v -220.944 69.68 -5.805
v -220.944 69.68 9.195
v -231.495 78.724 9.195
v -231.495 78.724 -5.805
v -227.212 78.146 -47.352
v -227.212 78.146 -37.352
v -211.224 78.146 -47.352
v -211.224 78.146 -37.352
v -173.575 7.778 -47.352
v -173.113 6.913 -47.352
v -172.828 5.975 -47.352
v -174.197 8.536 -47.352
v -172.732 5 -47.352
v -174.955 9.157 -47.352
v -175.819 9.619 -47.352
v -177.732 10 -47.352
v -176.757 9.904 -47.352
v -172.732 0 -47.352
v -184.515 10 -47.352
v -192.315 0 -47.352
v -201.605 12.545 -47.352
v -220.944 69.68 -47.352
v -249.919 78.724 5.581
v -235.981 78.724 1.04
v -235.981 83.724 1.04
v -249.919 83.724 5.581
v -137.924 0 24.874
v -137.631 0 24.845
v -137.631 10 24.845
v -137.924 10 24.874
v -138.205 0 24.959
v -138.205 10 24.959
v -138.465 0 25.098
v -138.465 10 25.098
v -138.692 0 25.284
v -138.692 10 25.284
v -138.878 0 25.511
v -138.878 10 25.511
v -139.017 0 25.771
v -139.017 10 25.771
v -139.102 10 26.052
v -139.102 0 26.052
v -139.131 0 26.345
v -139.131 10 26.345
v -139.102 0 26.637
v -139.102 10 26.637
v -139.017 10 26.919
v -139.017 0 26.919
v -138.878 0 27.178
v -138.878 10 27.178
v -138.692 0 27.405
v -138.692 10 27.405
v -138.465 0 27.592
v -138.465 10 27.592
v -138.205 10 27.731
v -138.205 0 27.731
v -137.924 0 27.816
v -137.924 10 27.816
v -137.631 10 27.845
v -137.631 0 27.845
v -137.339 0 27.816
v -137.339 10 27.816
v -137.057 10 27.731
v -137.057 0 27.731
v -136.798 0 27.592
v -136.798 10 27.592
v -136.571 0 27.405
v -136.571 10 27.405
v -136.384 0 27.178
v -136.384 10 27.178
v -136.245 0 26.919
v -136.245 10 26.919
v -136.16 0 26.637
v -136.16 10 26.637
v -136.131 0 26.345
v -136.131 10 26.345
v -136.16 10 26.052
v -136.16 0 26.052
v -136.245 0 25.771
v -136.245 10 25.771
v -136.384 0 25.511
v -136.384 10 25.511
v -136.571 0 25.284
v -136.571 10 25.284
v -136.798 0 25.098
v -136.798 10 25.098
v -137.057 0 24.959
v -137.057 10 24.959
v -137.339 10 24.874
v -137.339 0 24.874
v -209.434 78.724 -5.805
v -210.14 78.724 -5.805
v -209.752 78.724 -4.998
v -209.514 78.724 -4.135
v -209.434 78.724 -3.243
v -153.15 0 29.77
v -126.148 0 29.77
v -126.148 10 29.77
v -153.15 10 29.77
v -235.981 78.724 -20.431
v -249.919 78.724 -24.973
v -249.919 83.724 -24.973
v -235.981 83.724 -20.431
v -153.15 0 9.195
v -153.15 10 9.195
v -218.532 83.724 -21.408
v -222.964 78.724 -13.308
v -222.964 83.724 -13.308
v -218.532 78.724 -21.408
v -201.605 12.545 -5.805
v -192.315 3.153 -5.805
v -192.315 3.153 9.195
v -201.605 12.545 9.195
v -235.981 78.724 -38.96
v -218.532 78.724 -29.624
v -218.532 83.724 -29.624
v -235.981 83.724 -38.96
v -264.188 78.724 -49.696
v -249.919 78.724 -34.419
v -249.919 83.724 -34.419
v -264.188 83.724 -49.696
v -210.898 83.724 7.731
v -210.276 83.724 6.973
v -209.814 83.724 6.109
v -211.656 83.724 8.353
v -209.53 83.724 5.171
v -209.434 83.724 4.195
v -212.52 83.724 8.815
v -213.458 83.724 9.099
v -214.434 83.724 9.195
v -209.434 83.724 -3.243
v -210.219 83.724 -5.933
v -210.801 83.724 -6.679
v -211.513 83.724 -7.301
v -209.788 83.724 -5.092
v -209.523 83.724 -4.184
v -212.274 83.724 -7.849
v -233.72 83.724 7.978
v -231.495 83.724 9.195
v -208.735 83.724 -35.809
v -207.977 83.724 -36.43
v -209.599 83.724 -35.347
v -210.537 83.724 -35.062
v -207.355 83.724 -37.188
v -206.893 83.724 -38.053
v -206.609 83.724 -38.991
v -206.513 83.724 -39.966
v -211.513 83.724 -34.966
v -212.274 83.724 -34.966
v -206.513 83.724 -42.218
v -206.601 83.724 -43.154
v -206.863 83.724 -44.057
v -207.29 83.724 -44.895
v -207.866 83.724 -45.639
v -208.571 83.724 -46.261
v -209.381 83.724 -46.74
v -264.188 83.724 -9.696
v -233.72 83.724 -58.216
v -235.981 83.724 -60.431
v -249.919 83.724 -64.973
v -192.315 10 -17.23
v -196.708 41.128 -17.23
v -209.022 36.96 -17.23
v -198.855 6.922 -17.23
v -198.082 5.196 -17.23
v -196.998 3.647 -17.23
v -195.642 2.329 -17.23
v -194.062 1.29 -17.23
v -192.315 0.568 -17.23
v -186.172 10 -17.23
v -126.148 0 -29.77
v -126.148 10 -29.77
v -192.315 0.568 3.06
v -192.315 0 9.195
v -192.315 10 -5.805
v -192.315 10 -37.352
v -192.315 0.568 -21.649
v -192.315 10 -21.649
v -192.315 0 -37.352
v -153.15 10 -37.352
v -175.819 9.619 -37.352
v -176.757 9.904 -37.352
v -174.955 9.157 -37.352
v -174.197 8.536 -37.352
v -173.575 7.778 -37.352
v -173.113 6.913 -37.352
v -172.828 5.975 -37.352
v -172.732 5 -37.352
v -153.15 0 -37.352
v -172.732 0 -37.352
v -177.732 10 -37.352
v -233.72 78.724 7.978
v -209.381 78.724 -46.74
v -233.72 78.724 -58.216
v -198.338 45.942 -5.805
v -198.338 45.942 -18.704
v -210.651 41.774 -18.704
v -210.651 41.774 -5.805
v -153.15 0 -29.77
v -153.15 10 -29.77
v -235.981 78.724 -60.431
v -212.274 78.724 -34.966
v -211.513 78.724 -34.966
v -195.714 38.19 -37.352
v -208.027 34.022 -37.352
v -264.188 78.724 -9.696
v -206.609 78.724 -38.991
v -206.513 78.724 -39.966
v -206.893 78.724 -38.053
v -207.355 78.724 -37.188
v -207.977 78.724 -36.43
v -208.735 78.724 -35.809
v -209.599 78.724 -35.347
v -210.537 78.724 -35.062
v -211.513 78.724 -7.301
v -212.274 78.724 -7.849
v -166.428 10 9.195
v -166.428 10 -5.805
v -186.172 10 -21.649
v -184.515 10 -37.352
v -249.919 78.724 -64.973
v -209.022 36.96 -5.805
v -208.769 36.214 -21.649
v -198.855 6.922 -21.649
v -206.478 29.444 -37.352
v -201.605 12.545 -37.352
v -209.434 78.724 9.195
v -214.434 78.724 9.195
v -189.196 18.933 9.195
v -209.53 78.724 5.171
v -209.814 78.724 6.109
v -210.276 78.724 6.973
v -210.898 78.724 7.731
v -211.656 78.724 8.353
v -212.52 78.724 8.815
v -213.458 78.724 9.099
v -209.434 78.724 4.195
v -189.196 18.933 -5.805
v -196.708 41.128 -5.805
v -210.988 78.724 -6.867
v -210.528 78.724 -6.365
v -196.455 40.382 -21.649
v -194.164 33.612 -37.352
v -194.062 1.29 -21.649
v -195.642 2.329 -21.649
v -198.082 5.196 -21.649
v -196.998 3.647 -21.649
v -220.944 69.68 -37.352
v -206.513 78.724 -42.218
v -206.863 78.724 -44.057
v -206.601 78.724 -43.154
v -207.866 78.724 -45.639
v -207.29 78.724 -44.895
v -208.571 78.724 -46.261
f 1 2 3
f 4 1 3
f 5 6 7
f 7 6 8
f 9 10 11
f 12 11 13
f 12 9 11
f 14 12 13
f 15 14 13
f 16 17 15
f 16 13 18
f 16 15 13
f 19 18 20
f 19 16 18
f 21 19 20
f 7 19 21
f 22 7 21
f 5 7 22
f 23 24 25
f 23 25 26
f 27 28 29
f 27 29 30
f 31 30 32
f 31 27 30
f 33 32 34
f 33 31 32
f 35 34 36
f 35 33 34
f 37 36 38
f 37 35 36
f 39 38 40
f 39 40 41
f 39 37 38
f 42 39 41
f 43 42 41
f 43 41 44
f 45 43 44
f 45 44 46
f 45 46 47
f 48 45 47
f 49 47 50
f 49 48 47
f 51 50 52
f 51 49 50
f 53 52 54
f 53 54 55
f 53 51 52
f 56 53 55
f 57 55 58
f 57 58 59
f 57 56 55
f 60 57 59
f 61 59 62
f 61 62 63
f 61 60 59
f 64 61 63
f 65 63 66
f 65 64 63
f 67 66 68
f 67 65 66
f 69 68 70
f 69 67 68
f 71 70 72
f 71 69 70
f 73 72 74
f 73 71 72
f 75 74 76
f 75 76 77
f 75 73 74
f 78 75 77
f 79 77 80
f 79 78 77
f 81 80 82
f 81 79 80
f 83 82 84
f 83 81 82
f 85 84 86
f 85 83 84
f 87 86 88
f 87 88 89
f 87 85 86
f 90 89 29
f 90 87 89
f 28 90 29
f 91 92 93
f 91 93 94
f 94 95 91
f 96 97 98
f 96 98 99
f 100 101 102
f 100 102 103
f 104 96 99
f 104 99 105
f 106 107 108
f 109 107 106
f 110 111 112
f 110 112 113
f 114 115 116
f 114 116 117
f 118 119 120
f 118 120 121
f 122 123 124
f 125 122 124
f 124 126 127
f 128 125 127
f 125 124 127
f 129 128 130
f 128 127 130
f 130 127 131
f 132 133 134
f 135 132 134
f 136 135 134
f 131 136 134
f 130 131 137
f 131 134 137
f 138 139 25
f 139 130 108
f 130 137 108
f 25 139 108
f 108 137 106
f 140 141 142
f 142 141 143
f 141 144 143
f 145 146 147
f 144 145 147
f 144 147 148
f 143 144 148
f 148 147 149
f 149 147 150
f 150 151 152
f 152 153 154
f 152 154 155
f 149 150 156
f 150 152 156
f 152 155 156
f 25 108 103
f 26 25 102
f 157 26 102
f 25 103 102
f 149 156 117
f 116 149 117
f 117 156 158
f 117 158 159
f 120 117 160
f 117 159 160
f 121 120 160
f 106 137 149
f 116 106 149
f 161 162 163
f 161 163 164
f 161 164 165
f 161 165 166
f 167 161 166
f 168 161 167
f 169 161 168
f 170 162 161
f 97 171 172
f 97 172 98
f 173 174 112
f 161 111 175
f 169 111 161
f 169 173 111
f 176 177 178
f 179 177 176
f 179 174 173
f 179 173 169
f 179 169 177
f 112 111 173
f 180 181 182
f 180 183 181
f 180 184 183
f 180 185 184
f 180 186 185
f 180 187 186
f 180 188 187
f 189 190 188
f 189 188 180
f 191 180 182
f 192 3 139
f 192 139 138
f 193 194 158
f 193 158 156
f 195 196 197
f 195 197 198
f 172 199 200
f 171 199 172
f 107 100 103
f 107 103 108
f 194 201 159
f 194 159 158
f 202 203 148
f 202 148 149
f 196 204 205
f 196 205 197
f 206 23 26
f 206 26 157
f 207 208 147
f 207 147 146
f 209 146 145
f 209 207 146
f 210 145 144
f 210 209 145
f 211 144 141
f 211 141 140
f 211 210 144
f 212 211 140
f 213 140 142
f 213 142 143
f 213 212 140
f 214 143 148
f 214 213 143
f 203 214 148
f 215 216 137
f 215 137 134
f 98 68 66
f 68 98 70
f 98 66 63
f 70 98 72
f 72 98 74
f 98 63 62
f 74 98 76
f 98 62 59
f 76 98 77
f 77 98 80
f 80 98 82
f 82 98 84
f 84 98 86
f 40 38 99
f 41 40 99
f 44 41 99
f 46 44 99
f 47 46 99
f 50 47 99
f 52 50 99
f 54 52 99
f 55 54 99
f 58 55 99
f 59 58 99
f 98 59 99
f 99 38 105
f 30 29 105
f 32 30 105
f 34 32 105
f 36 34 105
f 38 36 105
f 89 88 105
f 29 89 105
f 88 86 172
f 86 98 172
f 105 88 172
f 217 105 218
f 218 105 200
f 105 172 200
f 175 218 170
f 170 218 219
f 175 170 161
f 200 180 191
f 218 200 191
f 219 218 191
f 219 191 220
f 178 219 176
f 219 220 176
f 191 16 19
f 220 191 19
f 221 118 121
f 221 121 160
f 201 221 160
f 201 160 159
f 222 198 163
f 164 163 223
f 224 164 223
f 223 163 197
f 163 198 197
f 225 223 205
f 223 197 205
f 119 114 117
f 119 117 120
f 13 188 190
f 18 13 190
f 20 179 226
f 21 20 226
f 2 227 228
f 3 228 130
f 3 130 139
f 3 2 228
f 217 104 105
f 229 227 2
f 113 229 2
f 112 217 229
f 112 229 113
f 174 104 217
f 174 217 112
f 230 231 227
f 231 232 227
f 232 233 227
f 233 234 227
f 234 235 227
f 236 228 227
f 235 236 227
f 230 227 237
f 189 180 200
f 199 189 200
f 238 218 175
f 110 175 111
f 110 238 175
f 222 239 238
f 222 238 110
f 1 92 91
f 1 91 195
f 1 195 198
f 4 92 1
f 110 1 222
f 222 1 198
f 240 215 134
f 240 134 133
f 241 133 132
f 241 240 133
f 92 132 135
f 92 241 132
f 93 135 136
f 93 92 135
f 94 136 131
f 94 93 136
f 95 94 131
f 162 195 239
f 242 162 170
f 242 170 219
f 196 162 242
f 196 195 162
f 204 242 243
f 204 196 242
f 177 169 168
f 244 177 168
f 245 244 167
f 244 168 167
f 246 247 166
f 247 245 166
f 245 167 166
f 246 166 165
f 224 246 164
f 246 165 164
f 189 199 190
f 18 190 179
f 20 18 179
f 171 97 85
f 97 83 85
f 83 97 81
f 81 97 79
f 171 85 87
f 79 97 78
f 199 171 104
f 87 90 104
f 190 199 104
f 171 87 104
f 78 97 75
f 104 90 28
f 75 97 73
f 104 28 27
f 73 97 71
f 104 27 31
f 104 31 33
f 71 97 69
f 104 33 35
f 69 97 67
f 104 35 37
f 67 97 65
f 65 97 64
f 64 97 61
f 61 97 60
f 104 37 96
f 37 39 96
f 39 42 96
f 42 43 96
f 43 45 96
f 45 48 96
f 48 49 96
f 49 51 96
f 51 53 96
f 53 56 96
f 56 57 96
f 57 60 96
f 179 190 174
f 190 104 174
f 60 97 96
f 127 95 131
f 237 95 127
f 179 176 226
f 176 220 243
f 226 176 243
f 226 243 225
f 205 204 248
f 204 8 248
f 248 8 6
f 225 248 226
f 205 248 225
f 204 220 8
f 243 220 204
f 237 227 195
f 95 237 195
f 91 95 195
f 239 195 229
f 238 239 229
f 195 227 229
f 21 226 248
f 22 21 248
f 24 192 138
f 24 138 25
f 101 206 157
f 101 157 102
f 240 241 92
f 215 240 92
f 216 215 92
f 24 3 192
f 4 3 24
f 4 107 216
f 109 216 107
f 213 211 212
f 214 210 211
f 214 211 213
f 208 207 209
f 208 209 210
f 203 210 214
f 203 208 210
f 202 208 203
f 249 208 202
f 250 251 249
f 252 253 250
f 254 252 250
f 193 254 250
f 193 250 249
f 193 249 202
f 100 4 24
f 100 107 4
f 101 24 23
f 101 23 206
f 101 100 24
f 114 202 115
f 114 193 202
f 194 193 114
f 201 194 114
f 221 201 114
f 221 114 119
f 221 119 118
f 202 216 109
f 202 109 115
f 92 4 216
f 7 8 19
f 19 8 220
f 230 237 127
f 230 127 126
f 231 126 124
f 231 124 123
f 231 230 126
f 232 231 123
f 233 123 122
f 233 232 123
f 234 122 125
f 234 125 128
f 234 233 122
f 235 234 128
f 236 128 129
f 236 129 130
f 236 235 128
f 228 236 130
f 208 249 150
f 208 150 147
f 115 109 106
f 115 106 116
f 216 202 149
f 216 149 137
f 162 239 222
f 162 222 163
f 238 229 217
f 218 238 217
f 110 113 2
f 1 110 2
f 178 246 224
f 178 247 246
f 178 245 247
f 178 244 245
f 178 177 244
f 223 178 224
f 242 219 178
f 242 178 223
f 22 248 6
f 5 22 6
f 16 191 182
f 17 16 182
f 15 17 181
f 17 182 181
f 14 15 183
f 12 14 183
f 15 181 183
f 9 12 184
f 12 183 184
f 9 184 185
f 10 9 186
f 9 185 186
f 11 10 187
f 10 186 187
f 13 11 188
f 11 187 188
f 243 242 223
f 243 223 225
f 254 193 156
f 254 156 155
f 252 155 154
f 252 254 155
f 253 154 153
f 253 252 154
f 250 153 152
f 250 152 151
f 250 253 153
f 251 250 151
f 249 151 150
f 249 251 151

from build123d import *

# Parameters (mm, degrees)
CROQUIS1_R              = 1.5
SALIENTE_EXTRUIR1_DEPTH = 10
SALIENTE_EXTRUIR2_DEPTH = 15
SALIENTE_EXTRUIR3_DEPTH = 13
SALIENTE_EXTRUIR7_DEPTH = 5
REDONDEO2_R             = 10
SALIENTE_EXTRUIR8_DEPTH = 10


with BuildPart() as part:
    # Croquis1 → Saliente-Extruir1 (new body)
    with BuildSketch(Plane(origin=(0, 0, 0), x_dir=(1, 0, 0), z_dir=(0, 1, 0))):
        Polygon((-192.31475004, 37.351943635), (-153.149960772, 37.351943635), (-153.149960772, 29.769862991), (-126.147833027, 29.769862991), (-126.147833027, -29.769862991), (-153.149960772, -29.769862991), (-153.149960772, -9.1952793), (-192.31475004, -9.1952793), align=None)
        with Locations(Location((-137.631197841, -26.344824576, 0), (0, 0, 90))):
            Circle(CROQUIS1_R, mode=Mode.SUBTRACT)
    extrude(amount=SALIENTE_EXTRUIR1_DEPTH)

    # Croquis3 → Saliente-Extruir2 (add)
    with BuildSketch(Plane.XY.offset(9.1952793)):
        Polygon((-189.195504205, 0), (-201.604805992, 12.545329197), (-220.943628409, 69.680078214), (-231.495067756, 78.724169083), (-209.43357333, 78.724169083), (-189.195504205, 18.932679451), (-166.427858451, 10), (-166.427858451, 0), align=None)
    extrude(amount=-SALIENTE_EXTRUIR2_DEPTH)

    # Croquis8 → Saliente-Extruir3 (add)
    with BuildSketch(Plane(origin=(-163.998418841, -55.509761627, 0), x_dir=(0, 0, -1), z_dir=(0.9472114013741786, 0.3206096709501519, 0))):
        Polygon((5.8047207, 107.105877542), (5.8047207, 102.023441322), (17.229529669, 102.023441322), (17.229529669, 62.195551935), (21.649352835, 62.195551935), (21.649352835, 101.235469829), (41.412588148, 92.240137187), (41.412588148, 97.139259402), (18.703552524, 107.105877542), align=None)
    extrude(amount=-SALIENTE_EXTRUIR3_DEPTH)

    # Croquis10 → Saliente-Extruir7 (add)
    with BuildSketch(Plane(origin=(0, 78.724169083, 0), x_dir=(1, 0, 0), z_dir=(0, 1, 0))):
        with BuildLine():
            Line((-249.918671642, 64.972502389), (-235.980528396, 60.431124344))
            Line((-235.980528396, 60.431124344), (-233.719997047, 58.216185839))
            Line((-233.719997047, 58.216185839), (-209.380524185, 46.740483345))
            ThreePointArc((-209.380524185, 46.740483345), (-207.290181053, 44.895496777), (-206.512830069, 42.217954006))
            Line((-206.512830069, 42.217954006), (-206.512830069, 39.966009421))
            ThreePointArc((-206.512830069, 39.966009421), (-207.977296163, 36.430475515), (-211.512830069, 34.966009421))
            Line((-211.512830069, 34.966009421), (-212.273678507, 34.966009421))
            Line((-212.273678507, 34.966009421), (-212.273678507, 7.849044618))
            Line((-212.273678507, 7.849044618), (-211.512568985, 7.30119364))
            ThreePointArc((-211.512568985, 7.30119364), (-209.983572109, 5.522948339), (-209.43357333, 3.243148098))
            Line((-209.43357333, 3.243148098), (-209.43357333, -4.1952793))
            ThreePointArc((-209.43357333, -4.1952793), (-210.898039424, -7.730813206), (-214.43357333, -9.1952793))
            Line((-214.43357333, -9.1952793), (-231.495067756, -9.1952793))
            Line((-231.495067756, -9.1952793), (-233.719997047, -7.977642104))
            Line((-233.719997047, -7.977642104), (-235.980528396, -1.039745845))
            Line((-235.980528396, -1.039745845), (-249.918671642, -5.581123891))
            Line((-249.918671642, -5.581123891), (-264.188355718, 9.695689249))
            Line((-264.188355718, 9.695689249), (-249.918671642, 24.972502389))
            Line((-249.918671642, 24.972502389), (-235.980528396, 20.431124344))
            Line((-235.980528396, 20.431124344), (-222.964320543, 13.307743434))
            Line((-222.964320543, 13.307743434), (-218.531551458, 21.40752702))
            Line((-218.531551458, 21.40752702), (-218.531551458, 29.623801484))
            Line((-218.531551458, 29.623801484), (-235.980528396, 38.960254155))
            Line((-235.980528396, 38.960254155), (-249.918671642, 34.418876109))
            Line((-249.918671642, 34.418876109), (-264.188355718, 49.695689249))
            Line((-264.188355718, 49.695689249), (-249.918671642, 64.972502389))
        make_face()
    extrude(amount=SALIENTE_EXTRUIR7_DEPTH)

    # Redondeo2
    # the kernel refuses this fillet: 10 mm, written as the material it takes off along each edge
    with BuildSketch(Plane(origin=(-196.252662499, -0.765351442, 3.059587863), x_dir=(0.947211401374178, 0.3206096709501537, 0), z_dir=(0, 0, -1))) as redondeo2_piece_1:
        with BuildLine():
            CenterArc((10, -8.115647013), REDONDEO2_R, 125.75091012, 54.24908988)
            Line((0, -8.115647013), (-0.2, -8.115647013))
            Line((-0.2, -8.115647013), (-0.2, 0))
            Line((-0.2, 0), (0, 0.2))
            ThreePointArc((0, 0.2), (2.078687215, 0.2), (4.040521918, 0.16231294))
            Line((4.040521918, 0.16231294), (4.157374429, 0))
        make_face()
    extrude(amount=44.99805823, mode=Mode.SUBTRACT)

    # Croquis13 → Saliente-Extruir8 (add)
    with BuildSketch(Plane(origin=(0, 0, -37.351943635), x_dir=(-1, 0, 0), z_dir=(0, 0, -1))):
        with BuildLine():
            Line((192.31475004, 0), (201.604805992, 12.545329197))
            Line((201.604805992, 12.545329197), (220.943628409, 69.680078214))
            Line((220.943628409, 69.680078214), (227.212441383, 78.145508653))
            Line((227.212441383, 78.145508653), (211.22386426, 78.145508653))
            Line((211.22386426, 78.145508653), (184.515278381, 10))
            Line((184.515278381, 10), (177.732355406, 10))
            ThreePointArc((177.732355406, 10), (174.1968215, 8.535533906), (172.732355406, 5))
            Line((172.732355406, 5), (172.732355406, 0))
            Line((172.732355406, 0), (182.732355406, 0))
            Line((182.732355406, 0), (192.31475004, 0))
        make_face()
    extrude(amount=SALIENTE_EXTRUIR8_DEPTH)


solid = part.part
